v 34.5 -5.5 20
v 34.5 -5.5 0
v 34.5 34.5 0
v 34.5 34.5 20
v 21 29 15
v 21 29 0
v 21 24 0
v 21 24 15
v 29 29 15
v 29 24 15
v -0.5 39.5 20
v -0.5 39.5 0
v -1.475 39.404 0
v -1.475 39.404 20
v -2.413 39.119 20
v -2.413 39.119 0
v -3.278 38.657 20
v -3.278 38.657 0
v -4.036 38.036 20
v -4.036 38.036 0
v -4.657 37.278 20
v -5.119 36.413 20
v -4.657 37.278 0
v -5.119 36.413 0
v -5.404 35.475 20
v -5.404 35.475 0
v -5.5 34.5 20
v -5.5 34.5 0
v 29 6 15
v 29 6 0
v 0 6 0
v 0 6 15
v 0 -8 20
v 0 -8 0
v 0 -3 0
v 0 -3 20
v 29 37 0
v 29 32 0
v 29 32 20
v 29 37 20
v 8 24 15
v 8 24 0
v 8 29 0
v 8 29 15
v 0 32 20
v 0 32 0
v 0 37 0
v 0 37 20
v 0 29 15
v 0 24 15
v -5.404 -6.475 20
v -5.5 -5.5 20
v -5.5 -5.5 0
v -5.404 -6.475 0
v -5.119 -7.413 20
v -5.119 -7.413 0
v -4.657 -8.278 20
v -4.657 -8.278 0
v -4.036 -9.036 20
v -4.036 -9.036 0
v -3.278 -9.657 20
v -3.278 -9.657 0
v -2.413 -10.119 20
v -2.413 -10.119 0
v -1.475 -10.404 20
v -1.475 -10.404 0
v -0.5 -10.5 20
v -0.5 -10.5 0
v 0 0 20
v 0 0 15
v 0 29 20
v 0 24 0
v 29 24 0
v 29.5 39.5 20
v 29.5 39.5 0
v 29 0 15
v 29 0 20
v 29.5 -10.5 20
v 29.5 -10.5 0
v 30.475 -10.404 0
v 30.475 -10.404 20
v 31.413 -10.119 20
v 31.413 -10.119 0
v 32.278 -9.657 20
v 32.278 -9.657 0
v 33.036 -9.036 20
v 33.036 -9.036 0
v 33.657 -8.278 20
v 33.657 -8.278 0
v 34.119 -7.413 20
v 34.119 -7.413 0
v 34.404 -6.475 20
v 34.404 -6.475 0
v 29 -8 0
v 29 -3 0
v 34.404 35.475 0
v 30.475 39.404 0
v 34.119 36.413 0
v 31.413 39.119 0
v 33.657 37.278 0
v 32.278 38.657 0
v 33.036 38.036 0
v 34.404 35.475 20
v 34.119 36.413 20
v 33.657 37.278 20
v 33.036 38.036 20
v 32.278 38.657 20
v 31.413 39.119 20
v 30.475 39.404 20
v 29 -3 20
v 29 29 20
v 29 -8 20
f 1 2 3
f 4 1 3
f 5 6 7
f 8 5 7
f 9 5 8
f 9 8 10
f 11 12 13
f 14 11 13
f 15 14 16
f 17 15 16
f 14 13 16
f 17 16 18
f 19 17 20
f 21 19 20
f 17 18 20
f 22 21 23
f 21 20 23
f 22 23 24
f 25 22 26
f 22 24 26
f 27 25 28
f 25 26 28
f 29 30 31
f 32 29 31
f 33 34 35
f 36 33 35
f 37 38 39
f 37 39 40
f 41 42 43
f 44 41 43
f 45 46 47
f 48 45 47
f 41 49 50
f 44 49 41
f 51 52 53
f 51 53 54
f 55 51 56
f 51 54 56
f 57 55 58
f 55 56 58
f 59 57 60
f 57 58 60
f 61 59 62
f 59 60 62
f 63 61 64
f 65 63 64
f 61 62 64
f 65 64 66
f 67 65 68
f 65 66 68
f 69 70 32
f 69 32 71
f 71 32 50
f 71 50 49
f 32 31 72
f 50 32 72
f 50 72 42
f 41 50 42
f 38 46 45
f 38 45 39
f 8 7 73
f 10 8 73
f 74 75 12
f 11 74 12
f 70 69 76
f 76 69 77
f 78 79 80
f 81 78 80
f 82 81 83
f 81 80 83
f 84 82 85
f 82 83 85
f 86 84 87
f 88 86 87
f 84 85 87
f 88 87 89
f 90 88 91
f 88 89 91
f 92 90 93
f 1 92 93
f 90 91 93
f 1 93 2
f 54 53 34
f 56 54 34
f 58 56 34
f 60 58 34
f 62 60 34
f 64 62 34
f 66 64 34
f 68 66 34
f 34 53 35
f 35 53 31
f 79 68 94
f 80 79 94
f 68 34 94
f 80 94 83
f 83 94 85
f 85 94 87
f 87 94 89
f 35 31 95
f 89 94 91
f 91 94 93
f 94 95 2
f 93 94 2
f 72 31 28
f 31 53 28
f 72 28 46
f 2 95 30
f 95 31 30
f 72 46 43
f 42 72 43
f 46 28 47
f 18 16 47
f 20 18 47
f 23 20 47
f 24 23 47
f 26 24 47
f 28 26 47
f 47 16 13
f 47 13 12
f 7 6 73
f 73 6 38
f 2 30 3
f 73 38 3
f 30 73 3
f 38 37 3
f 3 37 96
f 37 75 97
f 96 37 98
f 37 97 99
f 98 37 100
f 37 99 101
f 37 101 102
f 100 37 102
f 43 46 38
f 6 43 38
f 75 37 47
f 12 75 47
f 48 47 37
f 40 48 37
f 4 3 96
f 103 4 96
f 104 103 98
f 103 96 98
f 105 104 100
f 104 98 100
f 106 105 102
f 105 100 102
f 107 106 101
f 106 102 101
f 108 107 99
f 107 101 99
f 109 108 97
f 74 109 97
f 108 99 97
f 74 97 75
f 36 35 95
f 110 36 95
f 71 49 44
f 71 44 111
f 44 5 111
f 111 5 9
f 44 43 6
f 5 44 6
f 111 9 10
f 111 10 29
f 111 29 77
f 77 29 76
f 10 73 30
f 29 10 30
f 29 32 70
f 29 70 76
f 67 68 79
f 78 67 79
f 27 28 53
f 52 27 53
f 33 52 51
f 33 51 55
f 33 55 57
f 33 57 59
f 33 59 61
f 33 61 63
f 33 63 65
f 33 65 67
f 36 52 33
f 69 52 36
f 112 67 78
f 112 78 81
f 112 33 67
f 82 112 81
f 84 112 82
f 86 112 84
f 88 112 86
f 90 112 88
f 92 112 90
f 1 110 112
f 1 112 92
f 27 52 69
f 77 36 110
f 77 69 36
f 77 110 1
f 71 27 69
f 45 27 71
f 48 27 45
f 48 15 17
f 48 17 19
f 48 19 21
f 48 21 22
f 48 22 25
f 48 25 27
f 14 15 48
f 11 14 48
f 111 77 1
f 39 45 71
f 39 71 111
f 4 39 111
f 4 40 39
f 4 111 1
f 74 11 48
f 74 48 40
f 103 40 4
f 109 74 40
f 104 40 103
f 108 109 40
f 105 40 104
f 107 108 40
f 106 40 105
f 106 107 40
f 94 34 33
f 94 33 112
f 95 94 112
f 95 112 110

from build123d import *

# Parameters (mm, degrees)
SKETCH2_W           = 29
SKETCH2_H           = 5
BOSS_EXTRUDE2_DEPTH = 20
SKETCH3_W           = 8
SKETCH3_H           = 5
SKETCH3_W_2         = 29
SKETCH3_H_2         = 6
CUT_EXTRUDE1_DEPTH  = 5


with BuildPart() as part:
    # Sketch2 → Boss-Extrude2 (new body)
    with BuildSketch(Plane.XY):
        with BuildLine():
            ThreePointArc((-5.5, -5.5), (-4.035533906, -9.035533906), (-0.5, -10.5))
            Line((-0.5, -10.5), (29.5, -10.5))
            ThreePointArc((29.5, -10.5), (33.035533906, -9.035533906), (34.5, -5.5))
            Line((34.5, -5.5), (34.5, 34.5))
            ThreePointArc((34.5, 34.5), (33.035533906, 38.035533906), (29.5, 39.5))
            Line((29.5, 39.5), (-0.5, 39.5))
            ThreePointArc((-0.5, 39.5), (-4.035533906, 38.035533906), (-5.5, 34.5))
            Line((-5.5, 34.5), (-5.5, -5.5))
        make_face()
        Polygon((29, 6), (0, 6), (0, 24), (8, 24), (8, 29), (21, 29), (21, 24), (29, 24), align=None, mode=Mode.SUBTRACT)
        with Locations((14.5, -5.5)):
            Rectangle(SKETCH2_W, SKETCH2_H, mode=Mode.SUBTRACT)
        with Locations((14.5, 34.5)):
            Rectangle(SKETCH2_W, SKETCH2_H, mode=Mode.SUBTRACT)
    extrude(amount=BOSS_EXTRUDE2_DEPTH)

    # Sketch3 → Cut-Extrude1 (cut)
    with BuildSketch(Plane.XY.offset(20)):
        with Locations((4, 26.5)):
            Rectangle(SKETCH3_W, SKETCH3_H)
        with Locations((25, 26.5)):
            Rectangle(SKETCH3_W, SKETCH3_H)
        with Locations((14.5, 3)):
            Rectangle(SKETCH3_W_2, SKETCH3_H_2)
    extrude(amount=-CUT_EXTRUDE1_DEPTH, mode=Mode.SUBTRACT)


solid = part.part
